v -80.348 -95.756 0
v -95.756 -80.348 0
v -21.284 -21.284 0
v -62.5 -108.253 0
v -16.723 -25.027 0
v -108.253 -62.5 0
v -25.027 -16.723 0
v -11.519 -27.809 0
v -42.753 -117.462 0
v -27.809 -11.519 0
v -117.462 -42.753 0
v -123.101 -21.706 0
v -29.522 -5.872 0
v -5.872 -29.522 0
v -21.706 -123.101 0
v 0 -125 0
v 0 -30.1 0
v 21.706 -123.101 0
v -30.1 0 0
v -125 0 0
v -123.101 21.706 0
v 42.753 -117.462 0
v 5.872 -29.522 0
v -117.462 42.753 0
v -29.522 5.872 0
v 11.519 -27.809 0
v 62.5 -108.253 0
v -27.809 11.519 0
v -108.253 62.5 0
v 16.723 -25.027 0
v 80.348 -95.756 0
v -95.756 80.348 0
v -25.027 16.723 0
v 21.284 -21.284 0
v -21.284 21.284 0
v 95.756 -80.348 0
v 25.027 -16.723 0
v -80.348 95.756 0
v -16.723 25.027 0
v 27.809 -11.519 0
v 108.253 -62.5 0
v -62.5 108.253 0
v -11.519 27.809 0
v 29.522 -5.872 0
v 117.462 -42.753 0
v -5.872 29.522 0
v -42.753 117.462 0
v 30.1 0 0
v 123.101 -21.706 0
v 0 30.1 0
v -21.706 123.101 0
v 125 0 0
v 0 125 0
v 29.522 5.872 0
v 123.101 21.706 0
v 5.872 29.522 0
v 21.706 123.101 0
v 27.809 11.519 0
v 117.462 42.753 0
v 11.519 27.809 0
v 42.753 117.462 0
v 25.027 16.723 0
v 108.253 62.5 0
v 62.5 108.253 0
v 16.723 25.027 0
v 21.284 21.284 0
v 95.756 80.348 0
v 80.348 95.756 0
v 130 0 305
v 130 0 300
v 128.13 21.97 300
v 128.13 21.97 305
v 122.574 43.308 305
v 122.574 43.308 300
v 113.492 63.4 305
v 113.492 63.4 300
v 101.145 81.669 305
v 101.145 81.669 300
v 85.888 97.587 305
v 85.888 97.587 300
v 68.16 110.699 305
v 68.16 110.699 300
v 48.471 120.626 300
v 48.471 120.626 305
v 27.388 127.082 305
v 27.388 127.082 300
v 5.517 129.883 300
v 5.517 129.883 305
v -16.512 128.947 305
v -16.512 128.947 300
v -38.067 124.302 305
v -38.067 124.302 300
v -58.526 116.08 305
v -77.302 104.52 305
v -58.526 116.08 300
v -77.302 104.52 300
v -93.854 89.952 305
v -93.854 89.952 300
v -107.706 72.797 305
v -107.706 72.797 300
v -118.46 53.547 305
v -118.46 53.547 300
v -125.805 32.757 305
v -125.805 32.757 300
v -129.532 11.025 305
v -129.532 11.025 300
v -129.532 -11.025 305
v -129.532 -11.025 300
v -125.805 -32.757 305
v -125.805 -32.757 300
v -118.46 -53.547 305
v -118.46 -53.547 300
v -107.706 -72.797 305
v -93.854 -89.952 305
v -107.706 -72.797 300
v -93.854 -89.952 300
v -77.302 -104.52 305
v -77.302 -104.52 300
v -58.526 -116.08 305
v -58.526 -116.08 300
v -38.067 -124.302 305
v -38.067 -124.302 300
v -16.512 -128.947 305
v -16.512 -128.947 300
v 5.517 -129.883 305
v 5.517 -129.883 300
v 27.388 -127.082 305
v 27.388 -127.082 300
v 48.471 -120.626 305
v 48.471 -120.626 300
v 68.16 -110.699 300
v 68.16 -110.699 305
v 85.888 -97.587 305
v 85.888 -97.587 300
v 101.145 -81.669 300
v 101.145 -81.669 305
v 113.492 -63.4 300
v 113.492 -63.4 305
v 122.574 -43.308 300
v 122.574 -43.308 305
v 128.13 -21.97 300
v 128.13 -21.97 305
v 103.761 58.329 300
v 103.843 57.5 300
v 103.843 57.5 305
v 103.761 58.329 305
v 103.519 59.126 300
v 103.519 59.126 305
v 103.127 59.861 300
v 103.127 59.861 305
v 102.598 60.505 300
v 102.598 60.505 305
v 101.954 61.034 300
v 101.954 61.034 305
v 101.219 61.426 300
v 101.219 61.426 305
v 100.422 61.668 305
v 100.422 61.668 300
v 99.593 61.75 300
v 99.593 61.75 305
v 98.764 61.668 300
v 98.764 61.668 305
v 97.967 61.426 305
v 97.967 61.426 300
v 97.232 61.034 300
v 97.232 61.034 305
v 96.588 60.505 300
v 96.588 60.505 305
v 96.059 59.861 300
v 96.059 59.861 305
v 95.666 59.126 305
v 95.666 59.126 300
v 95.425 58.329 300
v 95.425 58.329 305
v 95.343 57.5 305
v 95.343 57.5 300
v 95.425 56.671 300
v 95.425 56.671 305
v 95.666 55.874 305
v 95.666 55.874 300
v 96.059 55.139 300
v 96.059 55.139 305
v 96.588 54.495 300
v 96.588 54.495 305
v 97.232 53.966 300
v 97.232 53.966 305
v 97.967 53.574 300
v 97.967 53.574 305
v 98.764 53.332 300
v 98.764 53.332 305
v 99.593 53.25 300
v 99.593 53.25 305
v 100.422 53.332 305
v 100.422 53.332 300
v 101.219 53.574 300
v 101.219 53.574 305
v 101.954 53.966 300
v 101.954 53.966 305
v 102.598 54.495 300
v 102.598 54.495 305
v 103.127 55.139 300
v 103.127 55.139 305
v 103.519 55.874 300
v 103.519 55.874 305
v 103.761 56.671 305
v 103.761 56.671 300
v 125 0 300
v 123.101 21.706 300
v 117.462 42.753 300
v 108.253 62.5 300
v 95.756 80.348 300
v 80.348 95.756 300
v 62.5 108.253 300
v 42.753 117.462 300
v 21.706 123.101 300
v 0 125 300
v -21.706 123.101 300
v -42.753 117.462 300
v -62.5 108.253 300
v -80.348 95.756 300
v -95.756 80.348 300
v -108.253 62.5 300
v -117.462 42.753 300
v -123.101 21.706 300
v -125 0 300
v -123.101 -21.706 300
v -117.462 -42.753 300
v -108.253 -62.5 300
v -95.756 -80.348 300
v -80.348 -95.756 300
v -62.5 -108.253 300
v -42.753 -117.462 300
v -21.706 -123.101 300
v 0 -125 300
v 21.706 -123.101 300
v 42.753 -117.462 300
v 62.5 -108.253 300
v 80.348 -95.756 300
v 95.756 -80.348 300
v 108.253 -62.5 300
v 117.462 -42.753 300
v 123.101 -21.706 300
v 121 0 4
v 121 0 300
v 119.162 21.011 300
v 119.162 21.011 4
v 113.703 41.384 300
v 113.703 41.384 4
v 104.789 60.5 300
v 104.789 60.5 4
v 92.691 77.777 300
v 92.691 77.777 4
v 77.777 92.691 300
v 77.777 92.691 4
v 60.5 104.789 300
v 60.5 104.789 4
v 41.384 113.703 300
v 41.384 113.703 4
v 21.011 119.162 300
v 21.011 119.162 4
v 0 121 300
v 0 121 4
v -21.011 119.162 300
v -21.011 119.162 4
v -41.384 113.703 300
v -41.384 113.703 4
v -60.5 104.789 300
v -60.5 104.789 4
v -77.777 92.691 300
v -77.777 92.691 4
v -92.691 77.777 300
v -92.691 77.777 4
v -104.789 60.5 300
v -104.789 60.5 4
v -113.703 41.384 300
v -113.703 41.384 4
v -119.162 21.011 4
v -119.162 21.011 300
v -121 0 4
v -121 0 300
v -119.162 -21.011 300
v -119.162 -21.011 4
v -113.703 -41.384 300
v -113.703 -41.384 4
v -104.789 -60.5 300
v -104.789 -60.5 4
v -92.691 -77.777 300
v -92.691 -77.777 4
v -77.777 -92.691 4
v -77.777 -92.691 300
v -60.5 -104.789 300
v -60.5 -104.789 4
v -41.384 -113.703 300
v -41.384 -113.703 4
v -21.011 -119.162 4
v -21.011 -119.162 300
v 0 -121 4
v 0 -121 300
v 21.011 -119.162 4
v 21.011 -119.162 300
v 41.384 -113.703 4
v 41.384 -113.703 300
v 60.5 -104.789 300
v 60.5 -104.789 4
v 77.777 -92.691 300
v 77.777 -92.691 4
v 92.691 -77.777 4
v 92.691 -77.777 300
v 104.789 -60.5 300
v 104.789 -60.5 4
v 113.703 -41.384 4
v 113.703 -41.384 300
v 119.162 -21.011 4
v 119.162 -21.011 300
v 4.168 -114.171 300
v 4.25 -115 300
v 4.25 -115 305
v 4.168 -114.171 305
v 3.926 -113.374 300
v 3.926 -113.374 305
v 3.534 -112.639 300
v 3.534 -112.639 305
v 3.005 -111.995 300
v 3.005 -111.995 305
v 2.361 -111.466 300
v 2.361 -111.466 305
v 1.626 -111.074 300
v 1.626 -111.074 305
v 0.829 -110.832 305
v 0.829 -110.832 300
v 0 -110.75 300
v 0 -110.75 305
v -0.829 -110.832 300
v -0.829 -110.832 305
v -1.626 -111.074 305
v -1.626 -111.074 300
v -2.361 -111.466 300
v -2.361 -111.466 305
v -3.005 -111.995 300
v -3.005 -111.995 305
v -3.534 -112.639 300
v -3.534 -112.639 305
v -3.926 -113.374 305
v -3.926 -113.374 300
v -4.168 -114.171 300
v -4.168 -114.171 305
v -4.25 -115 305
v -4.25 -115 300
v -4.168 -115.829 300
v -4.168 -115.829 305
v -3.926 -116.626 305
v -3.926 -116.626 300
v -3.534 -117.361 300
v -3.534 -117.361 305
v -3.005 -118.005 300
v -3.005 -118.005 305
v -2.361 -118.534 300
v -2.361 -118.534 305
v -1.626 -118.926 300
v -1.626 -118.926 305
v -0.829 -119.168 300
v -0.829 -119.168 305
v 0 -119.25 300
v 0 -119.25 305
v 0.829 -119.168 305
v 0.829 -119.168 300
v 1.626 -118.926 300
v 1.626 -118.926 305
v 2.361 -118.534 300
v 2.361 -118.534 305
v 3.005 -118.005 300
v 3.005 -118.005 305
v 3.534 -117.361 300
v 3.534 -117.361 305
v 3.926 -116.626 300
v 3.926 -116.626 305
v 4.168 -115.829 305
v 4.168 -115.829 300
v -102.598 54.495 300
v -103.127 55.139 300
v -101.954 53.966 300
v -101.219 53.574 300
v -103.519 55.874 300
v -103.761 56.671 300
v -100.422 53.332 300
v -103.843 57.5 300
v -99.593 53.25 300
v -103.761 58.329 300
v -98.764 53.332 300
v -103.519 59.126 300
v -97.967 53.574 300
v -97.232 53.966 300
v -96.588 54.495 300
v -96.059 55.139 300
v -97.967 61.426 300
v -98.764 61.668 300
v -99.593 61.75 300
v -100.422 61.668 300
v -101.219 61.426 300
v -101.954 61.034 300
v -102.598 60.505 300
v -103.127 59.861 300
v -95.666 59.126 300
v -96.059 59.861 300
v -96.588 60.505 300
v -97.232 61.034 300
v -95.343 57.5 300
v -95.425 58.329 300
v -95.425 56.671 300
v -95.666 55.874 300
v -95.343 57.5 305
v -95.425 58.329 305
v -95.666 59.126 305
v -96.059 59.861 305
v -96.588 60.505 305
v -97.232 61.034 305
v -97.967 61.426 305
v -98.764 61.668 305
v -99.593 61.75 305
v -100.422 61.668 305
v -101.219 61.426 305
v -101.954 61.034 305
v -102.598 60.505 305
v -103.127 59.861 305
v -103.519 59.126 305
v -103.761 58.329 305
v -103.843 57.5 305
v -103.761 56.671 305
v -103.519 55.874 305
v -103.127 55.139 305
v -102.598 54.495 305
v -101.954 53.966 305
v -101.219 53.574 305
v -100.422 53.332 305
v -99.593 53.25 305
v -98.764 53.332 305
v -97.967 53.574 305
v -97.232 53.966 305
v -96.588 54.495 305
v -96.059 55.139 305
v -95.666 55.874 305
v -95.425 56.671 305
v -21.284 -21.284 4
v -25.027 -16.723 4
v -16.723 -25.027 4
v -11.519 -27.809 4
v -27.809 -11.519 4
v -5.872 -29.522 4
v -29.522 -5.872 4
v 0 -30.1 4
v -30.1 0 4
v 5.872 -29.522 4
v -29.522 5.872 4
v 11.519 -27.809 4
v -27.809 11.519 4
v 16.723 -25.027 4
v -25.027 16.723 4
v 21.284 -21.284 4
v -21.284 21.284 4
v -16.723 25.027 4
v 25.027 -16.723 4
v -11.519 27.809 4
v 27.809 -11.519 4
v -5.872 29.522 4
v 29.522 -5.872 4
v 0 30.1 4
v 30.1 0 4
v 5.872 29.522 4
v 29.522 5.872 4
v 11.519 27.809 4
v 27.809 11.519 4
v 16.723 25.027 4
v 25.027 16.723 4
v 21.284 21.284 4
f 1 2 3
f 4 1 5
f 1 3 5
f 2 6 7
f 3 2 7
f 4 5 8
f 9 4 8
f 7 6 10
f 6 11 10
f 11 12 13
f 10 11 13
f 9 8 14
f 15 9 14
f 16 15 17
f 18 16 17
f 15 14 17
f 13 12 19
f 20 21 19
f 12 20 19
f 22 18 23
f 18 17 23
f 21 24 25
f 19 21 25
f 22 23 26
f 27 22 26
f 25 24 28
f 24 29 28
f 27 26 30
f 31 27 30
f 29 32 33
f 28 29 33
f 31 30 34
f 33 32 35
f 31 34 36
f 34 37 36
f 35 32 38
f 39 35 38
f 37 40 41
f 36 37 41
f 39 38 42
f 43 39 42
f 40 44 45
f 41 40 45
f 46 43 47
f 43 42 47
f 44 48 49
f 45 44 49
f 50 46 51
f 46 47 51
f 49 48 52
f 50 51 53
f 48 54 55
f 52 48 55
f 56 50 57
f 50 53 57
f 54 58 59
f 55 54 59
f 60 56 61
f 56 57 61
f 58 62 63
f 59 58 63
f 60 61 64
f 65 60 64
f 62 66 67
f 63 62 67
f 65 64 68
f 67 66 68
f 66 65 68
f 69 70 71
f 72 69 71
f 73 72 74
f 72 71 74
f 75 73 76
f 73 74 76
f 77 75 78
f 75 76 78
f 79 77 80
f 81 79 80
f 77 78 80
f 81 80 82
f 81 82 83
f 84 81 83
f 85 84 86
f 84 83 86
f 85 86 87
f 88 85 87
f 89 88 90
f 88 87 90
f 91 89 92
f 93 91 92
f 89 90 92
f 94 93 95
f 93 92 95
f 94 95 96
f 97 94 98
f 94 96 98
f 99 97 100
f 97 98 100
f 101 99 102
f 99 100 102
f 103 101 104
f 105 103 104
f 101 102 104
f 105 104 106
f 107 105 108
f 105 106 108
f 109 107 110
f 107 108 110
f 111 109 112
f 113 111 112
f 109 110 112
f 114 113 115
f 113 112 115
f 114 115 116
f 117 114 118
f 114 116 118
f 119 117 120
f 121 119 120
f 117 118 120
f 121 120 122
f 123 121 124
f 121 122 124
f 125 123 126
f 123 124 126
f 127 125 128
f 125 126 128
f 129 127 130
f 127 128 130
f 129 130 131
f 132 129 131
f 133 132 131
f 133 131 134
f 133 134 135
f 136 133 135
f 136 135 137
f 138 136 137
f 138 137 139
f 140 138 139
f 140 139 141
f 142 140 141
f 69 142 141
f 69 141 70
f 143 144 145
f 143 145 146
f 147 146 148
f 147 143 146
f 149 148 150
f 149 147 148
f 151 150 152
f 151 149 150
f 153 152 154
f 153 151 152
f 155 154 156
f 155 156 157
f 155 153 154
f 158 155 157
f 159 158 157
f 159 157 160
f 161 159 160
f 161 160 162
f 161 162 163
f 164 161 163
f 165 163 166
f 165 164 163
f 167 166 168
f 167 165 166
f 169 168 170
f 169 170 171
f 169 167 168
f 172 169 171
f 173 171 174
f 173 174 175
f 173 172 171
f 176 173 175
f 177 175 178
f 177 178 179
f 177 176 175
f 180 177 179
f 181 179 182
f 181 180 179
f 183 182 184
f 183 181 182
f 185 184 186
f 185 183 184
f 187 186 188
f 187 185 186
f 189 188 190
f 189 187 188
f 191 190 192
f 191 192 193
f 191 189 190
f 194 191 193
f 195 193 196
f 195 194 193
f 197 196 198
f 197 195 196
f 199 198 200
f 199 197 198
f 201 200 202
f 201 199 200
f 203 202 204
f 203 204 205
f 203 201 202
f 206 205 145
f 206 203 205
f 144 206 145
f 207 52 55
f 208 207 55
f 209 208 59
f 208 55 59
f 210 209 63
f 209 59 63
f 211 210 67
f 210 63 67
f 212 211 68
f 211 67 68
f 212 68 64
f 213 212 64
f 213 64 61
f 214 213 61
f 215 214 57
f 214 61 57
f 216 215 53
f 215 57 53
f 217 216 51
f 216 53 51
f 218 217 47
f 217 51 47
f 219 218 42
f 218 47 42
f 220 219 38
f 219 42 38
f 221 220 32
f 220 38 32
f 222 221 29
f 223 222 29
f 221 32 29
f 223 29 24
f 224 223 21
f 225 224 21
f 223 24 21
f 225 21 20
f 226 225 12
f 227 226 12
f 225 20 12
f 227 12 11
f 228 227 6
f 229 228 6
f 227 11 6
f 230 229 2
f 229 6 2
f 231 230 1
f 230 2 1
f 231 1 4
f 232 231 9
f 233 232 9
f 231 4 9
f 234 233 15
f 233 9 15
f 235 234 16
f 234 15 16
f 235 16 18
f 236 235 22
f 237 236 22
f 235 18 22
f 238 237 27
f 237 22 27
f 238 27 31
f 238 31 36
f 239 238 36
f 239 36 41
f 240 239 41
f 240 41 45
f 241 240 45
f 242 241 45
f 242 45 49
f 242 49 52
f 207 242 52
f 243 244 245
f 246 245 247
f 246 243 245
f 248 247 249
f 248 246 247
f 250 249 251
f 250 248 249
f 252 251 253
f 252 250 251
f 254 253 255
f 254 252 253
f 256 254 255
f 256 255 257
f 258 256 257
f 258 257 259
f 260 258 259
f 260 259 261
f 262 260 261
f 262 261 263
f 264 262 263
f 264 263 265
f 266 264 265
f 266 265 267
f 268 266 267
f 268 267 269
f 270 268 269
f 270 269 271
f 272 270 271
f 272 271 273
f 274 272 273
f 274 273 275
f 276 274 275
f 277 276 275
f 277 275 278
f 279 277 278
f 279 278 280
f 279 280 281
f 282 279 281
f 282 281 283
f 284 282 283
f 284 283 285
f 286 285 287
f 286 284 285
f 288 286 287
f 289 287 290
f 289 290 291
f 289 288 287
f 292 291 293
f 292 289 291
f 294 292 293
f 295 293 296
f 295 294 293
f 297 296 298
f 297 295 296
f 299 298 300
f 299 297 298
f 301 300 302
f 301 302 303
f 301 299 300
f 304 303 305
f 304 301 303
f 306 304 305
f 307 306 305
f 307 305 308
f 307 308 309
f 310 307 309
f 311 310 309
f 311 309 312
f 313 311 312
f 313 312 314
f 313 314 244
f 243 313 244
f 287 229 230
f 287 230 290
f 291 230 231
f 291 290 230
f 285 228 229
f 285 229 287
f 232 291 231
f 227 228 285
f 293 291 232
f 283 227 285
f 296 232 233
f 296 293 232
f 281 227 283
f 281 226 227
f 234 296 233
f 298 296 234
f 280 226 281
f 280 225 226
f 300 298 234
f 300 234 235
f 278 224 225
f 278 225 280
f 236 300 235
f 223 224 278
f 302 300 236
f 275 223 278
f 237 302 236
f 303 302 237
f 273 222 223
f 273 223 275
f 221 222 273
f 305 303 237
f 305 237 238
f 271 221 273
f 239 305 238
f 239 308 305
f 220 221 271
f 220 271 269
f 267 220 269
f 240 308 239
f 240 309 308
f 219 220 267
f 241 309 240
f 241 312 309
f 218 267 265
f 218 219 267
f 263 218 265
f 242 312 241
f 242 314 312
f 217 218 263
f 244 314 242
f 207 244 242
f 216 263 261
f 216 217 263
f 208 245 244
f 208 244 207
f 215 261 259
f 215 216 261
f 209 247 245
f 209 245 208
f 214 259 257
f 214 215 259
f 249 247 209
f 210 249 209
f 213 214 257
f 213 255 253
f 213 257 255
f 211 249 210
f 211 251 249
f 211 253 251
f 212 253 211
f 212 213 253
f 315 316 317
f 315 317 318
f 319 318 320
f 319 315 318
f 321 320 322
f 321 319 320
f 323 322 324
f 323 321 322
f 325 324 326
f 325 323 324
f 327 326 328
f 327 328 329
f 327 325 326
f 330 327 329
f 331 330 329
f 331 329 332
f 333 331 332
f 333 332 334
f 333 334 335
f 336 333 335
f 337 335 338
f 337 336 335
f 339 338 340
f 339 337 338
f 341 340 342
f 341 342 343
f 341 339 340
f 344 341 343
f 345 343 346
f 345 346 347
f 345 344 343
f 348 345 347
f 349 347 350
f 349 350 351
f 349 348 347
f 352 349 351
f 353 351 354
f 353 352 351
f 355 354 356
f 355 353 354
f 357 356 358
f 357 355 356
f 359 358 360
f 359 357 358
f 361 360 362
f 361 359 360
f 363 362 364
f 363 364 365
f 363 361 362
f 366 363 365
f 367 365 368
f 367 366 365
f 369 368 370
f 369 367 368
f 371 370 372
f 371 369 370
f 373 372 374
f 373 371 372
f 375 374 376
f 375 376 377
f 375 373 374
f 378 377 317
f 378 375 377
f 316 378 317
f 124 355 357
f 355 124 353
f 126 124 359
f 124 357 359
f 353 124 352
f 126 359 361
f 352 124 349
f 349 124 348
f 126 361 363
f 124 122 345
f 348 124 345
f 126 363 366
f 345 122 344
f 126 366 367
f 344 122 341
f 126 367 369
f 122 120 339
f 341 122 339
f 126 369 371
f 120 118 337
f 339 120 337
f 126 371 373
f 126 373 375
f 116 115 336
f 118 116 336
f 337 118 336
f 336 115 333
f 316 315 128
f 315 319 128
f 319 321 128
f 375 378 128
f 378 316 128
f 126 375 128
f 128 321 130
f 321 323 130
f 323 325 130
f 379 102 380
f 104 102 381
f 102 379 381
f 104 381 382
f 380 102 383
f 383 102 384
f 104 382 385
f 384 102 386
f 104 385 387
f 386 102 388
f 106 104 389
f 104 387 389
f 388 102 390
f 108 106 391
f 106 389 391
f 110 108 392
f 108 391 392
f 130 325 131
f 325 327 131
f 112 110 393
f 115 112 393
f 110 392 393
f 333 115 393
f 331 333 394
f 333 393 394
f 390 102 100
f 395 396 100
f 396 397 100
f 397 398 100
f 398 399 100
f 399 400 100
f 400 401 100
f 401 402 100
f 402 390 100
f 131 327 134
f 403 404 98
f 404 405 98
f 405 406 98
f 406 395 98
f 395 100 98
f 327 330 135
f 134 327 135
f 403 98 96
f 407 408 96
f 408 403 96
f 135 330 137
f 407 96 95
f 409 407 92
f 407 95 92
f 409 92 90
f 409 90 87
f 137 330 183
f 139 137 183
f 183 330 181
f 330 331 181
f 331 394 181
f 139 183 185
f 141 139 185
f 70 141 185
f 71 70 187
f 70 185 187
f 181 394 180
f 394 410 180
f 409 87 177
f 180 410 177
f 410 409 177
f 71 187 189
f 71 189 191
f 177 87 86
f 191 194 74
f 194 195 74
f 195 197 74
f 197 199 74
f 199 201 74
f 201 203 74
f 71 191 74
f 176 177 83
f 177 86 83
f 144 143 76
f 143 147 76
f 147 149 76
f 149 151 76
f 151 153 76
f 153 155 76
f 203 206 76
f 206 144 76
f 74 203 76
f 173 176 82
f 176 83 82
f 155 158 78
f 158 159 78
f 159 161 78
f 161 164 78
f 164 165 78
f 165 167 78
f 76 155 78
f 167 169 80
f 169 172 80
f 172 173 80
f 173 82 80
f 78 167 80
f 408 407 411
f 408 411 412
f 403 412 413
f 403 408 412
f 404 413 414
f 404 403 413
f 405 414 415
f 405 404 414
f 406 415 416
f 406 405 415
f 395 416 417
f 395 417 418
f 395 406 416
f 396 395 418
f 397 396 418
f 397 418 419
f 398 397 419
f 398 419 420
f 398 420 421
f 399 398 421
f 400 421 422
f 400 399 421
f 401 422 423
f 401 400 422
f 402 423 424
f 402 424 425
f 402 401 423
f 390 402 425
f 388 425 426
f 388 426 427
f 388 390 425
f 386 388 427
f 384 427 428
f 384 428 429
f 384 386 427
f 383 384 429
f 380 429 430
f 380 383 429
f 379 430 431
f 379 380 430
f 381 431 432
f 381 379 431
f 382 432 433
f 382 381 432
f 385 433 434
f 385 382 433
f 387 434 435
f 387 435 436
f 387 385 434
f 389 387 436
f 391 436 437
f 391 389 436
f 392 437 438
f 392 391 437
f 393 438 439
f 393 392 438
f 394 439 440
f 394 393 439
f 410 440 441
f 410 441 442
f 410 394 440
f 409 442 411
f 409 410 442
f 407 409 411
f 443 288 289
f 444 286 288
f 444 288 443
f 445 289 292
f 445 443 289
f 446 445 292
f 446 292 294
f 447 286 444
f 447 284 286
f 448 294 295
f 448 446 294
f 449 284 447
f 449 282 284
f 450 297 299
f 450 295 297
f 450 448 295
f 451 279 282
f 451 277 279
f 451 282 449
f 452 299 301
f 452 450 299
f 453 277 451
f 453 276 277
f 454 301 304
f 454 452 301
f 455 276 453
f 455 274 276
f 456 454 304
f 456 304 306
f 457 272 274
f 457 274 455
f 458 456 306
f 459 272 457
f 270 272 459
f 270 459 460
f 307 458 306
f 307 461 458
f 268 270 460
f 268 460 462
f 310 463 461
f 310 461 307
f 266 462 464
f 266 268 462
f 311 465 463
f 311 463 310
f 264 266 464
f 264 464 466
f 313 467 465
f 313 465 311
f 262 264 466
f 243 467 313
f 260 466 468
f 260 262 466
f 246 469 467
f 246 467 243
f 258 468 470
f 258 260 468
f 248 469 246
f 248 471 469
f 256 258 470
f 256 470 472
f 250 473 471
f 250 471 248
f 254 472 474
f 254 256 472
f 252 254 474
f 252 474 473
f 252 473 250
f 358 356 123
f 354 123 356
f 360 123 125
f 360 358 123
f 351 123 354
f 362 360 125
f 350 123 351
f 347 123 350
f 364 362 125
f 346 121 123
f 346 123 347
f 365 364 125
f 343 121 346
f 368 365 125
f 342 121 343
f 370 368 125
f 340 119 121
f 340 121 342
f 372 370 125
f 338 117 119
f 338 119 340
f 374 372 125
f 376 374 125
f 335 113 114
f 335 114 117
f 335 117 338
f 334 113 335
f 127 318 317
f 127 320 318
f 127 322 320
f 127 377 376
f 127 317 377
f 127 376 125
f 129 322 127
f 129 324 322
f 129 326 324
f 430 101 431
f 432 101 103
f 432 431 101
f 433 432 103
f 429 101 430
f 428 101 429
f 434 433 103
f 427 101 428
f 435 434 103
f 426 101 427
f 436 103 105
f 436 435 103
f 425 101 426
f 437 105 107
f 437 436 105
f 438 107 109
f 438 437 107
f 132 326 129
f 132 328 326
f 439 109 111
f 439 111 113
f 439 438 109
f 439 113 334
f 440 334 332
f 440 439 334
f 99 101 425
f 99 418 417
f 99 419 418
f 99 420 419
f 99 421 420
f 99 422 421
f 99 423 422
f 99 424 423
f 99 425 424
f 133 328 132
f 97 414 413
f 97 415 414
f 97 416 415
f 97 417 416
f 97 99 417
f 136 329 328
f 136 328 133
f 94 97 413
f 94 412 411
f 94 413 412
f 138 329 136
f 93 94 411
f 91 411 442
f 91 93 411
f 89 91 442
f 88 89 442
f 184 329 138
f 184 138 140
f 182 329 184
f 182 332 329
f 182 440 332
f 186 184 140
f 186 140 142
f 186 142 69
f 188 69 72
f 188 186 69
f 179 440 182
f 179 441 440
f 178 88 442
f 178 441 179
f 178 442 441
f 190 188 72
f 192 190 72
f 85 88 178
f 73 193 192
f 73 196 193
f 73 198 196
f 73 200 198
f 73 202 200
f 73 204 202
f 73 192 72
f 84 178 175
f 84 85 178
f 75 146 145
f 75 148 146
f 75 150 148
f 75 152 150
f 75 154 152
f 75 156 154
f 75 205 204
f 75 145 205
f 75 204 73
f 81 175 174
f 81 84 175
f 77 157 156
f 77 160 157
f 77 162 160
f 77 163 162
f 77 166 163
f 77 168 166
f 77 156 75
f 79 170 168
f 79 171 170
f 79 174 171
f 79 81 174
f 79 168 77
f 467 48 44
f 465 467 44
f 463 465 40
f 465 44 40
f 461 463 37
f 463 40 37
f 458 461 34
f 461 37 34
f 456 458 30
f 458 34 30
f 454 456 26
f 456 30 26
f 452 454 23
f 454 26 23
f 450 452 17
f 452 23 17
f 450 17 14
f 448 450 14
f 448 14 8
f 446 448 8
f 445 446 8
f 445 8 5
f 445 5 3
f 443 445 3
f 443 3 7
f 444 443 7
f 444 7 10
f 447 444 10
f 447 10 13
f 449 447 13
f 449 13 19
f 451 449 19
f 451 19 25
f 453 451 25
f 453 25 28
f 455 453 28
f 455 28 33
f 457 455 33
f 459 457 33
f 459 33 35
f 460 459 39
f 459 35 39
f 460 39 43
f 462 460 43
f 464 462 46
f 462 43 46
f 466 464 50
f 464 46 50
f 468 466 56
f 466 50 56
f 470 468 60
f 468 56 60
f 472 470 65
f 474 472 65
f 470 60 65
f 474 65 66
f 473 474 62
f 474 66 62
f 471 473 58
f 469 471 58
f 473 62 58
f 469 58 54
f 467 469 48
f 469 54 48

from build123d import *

# Parameters (mm, degrees)
F0_R     = 125
F1_DEPTH = 300
F2_T     = -4
F3_R     = 30.1
F4_DEPTH = 25
F5_R     = 130
F5_R_2   = 125
F5_R_3   = 121
F5_R_4   = 4.25
F6_DEPTH = 5


with BuildPart() as f1:
    # F0 (on Top) → F1 (new body)
    with BuildSketch(Plane.XY):
        Circle(F0_R)
    extrude(amount=F1_DEPTH)

    # F2
    f2_openings = [f1.faces().sort_by_distance(p)[0] for p in [
        (0, 0, 300),
    ]]
    offset(amount=F2_T, openings=f2_openings)

    # F3 (on face) → F4 (cut)
    with BuildSketch(Plane(origin=(0, 0, 0), x_dir=(1, 0, 0), z_dir=(0, 0, -1))):
        Circle(F3_R)
    extrude(amount=-F4_DEPTH, mode=Mode.SUBTRACT)


with BuildPart() as f6:
    # F5 (on face) → F6 (new body)
    with BuildSketch(Plane.XY.offset(300)):
        Circle(F5_R)
        Circle(F5_R_2, mode=Mode.SUBTRACT)
        Circle(F5_R_2)
        Circle(F5_R_3, mode=Mode.SUBTRACT)
        Circle(F5_R_3)
        with Locations((0, -115)):
            Circle(F5_R_4, mode=Mode.SUBTRACT)
        with Locations((-99.5929214352, 57.5)):
            Circle(F5_R_4, mode=Mode.SUBTRACT)
        with Locations((99.5929214352, 57.5)):
            Circle(F5_R_4, mode=Mode.SUBTRACT)
    extrude(amount=F6_DEPTH)


solid = Compound([f1.part, f6.part])
